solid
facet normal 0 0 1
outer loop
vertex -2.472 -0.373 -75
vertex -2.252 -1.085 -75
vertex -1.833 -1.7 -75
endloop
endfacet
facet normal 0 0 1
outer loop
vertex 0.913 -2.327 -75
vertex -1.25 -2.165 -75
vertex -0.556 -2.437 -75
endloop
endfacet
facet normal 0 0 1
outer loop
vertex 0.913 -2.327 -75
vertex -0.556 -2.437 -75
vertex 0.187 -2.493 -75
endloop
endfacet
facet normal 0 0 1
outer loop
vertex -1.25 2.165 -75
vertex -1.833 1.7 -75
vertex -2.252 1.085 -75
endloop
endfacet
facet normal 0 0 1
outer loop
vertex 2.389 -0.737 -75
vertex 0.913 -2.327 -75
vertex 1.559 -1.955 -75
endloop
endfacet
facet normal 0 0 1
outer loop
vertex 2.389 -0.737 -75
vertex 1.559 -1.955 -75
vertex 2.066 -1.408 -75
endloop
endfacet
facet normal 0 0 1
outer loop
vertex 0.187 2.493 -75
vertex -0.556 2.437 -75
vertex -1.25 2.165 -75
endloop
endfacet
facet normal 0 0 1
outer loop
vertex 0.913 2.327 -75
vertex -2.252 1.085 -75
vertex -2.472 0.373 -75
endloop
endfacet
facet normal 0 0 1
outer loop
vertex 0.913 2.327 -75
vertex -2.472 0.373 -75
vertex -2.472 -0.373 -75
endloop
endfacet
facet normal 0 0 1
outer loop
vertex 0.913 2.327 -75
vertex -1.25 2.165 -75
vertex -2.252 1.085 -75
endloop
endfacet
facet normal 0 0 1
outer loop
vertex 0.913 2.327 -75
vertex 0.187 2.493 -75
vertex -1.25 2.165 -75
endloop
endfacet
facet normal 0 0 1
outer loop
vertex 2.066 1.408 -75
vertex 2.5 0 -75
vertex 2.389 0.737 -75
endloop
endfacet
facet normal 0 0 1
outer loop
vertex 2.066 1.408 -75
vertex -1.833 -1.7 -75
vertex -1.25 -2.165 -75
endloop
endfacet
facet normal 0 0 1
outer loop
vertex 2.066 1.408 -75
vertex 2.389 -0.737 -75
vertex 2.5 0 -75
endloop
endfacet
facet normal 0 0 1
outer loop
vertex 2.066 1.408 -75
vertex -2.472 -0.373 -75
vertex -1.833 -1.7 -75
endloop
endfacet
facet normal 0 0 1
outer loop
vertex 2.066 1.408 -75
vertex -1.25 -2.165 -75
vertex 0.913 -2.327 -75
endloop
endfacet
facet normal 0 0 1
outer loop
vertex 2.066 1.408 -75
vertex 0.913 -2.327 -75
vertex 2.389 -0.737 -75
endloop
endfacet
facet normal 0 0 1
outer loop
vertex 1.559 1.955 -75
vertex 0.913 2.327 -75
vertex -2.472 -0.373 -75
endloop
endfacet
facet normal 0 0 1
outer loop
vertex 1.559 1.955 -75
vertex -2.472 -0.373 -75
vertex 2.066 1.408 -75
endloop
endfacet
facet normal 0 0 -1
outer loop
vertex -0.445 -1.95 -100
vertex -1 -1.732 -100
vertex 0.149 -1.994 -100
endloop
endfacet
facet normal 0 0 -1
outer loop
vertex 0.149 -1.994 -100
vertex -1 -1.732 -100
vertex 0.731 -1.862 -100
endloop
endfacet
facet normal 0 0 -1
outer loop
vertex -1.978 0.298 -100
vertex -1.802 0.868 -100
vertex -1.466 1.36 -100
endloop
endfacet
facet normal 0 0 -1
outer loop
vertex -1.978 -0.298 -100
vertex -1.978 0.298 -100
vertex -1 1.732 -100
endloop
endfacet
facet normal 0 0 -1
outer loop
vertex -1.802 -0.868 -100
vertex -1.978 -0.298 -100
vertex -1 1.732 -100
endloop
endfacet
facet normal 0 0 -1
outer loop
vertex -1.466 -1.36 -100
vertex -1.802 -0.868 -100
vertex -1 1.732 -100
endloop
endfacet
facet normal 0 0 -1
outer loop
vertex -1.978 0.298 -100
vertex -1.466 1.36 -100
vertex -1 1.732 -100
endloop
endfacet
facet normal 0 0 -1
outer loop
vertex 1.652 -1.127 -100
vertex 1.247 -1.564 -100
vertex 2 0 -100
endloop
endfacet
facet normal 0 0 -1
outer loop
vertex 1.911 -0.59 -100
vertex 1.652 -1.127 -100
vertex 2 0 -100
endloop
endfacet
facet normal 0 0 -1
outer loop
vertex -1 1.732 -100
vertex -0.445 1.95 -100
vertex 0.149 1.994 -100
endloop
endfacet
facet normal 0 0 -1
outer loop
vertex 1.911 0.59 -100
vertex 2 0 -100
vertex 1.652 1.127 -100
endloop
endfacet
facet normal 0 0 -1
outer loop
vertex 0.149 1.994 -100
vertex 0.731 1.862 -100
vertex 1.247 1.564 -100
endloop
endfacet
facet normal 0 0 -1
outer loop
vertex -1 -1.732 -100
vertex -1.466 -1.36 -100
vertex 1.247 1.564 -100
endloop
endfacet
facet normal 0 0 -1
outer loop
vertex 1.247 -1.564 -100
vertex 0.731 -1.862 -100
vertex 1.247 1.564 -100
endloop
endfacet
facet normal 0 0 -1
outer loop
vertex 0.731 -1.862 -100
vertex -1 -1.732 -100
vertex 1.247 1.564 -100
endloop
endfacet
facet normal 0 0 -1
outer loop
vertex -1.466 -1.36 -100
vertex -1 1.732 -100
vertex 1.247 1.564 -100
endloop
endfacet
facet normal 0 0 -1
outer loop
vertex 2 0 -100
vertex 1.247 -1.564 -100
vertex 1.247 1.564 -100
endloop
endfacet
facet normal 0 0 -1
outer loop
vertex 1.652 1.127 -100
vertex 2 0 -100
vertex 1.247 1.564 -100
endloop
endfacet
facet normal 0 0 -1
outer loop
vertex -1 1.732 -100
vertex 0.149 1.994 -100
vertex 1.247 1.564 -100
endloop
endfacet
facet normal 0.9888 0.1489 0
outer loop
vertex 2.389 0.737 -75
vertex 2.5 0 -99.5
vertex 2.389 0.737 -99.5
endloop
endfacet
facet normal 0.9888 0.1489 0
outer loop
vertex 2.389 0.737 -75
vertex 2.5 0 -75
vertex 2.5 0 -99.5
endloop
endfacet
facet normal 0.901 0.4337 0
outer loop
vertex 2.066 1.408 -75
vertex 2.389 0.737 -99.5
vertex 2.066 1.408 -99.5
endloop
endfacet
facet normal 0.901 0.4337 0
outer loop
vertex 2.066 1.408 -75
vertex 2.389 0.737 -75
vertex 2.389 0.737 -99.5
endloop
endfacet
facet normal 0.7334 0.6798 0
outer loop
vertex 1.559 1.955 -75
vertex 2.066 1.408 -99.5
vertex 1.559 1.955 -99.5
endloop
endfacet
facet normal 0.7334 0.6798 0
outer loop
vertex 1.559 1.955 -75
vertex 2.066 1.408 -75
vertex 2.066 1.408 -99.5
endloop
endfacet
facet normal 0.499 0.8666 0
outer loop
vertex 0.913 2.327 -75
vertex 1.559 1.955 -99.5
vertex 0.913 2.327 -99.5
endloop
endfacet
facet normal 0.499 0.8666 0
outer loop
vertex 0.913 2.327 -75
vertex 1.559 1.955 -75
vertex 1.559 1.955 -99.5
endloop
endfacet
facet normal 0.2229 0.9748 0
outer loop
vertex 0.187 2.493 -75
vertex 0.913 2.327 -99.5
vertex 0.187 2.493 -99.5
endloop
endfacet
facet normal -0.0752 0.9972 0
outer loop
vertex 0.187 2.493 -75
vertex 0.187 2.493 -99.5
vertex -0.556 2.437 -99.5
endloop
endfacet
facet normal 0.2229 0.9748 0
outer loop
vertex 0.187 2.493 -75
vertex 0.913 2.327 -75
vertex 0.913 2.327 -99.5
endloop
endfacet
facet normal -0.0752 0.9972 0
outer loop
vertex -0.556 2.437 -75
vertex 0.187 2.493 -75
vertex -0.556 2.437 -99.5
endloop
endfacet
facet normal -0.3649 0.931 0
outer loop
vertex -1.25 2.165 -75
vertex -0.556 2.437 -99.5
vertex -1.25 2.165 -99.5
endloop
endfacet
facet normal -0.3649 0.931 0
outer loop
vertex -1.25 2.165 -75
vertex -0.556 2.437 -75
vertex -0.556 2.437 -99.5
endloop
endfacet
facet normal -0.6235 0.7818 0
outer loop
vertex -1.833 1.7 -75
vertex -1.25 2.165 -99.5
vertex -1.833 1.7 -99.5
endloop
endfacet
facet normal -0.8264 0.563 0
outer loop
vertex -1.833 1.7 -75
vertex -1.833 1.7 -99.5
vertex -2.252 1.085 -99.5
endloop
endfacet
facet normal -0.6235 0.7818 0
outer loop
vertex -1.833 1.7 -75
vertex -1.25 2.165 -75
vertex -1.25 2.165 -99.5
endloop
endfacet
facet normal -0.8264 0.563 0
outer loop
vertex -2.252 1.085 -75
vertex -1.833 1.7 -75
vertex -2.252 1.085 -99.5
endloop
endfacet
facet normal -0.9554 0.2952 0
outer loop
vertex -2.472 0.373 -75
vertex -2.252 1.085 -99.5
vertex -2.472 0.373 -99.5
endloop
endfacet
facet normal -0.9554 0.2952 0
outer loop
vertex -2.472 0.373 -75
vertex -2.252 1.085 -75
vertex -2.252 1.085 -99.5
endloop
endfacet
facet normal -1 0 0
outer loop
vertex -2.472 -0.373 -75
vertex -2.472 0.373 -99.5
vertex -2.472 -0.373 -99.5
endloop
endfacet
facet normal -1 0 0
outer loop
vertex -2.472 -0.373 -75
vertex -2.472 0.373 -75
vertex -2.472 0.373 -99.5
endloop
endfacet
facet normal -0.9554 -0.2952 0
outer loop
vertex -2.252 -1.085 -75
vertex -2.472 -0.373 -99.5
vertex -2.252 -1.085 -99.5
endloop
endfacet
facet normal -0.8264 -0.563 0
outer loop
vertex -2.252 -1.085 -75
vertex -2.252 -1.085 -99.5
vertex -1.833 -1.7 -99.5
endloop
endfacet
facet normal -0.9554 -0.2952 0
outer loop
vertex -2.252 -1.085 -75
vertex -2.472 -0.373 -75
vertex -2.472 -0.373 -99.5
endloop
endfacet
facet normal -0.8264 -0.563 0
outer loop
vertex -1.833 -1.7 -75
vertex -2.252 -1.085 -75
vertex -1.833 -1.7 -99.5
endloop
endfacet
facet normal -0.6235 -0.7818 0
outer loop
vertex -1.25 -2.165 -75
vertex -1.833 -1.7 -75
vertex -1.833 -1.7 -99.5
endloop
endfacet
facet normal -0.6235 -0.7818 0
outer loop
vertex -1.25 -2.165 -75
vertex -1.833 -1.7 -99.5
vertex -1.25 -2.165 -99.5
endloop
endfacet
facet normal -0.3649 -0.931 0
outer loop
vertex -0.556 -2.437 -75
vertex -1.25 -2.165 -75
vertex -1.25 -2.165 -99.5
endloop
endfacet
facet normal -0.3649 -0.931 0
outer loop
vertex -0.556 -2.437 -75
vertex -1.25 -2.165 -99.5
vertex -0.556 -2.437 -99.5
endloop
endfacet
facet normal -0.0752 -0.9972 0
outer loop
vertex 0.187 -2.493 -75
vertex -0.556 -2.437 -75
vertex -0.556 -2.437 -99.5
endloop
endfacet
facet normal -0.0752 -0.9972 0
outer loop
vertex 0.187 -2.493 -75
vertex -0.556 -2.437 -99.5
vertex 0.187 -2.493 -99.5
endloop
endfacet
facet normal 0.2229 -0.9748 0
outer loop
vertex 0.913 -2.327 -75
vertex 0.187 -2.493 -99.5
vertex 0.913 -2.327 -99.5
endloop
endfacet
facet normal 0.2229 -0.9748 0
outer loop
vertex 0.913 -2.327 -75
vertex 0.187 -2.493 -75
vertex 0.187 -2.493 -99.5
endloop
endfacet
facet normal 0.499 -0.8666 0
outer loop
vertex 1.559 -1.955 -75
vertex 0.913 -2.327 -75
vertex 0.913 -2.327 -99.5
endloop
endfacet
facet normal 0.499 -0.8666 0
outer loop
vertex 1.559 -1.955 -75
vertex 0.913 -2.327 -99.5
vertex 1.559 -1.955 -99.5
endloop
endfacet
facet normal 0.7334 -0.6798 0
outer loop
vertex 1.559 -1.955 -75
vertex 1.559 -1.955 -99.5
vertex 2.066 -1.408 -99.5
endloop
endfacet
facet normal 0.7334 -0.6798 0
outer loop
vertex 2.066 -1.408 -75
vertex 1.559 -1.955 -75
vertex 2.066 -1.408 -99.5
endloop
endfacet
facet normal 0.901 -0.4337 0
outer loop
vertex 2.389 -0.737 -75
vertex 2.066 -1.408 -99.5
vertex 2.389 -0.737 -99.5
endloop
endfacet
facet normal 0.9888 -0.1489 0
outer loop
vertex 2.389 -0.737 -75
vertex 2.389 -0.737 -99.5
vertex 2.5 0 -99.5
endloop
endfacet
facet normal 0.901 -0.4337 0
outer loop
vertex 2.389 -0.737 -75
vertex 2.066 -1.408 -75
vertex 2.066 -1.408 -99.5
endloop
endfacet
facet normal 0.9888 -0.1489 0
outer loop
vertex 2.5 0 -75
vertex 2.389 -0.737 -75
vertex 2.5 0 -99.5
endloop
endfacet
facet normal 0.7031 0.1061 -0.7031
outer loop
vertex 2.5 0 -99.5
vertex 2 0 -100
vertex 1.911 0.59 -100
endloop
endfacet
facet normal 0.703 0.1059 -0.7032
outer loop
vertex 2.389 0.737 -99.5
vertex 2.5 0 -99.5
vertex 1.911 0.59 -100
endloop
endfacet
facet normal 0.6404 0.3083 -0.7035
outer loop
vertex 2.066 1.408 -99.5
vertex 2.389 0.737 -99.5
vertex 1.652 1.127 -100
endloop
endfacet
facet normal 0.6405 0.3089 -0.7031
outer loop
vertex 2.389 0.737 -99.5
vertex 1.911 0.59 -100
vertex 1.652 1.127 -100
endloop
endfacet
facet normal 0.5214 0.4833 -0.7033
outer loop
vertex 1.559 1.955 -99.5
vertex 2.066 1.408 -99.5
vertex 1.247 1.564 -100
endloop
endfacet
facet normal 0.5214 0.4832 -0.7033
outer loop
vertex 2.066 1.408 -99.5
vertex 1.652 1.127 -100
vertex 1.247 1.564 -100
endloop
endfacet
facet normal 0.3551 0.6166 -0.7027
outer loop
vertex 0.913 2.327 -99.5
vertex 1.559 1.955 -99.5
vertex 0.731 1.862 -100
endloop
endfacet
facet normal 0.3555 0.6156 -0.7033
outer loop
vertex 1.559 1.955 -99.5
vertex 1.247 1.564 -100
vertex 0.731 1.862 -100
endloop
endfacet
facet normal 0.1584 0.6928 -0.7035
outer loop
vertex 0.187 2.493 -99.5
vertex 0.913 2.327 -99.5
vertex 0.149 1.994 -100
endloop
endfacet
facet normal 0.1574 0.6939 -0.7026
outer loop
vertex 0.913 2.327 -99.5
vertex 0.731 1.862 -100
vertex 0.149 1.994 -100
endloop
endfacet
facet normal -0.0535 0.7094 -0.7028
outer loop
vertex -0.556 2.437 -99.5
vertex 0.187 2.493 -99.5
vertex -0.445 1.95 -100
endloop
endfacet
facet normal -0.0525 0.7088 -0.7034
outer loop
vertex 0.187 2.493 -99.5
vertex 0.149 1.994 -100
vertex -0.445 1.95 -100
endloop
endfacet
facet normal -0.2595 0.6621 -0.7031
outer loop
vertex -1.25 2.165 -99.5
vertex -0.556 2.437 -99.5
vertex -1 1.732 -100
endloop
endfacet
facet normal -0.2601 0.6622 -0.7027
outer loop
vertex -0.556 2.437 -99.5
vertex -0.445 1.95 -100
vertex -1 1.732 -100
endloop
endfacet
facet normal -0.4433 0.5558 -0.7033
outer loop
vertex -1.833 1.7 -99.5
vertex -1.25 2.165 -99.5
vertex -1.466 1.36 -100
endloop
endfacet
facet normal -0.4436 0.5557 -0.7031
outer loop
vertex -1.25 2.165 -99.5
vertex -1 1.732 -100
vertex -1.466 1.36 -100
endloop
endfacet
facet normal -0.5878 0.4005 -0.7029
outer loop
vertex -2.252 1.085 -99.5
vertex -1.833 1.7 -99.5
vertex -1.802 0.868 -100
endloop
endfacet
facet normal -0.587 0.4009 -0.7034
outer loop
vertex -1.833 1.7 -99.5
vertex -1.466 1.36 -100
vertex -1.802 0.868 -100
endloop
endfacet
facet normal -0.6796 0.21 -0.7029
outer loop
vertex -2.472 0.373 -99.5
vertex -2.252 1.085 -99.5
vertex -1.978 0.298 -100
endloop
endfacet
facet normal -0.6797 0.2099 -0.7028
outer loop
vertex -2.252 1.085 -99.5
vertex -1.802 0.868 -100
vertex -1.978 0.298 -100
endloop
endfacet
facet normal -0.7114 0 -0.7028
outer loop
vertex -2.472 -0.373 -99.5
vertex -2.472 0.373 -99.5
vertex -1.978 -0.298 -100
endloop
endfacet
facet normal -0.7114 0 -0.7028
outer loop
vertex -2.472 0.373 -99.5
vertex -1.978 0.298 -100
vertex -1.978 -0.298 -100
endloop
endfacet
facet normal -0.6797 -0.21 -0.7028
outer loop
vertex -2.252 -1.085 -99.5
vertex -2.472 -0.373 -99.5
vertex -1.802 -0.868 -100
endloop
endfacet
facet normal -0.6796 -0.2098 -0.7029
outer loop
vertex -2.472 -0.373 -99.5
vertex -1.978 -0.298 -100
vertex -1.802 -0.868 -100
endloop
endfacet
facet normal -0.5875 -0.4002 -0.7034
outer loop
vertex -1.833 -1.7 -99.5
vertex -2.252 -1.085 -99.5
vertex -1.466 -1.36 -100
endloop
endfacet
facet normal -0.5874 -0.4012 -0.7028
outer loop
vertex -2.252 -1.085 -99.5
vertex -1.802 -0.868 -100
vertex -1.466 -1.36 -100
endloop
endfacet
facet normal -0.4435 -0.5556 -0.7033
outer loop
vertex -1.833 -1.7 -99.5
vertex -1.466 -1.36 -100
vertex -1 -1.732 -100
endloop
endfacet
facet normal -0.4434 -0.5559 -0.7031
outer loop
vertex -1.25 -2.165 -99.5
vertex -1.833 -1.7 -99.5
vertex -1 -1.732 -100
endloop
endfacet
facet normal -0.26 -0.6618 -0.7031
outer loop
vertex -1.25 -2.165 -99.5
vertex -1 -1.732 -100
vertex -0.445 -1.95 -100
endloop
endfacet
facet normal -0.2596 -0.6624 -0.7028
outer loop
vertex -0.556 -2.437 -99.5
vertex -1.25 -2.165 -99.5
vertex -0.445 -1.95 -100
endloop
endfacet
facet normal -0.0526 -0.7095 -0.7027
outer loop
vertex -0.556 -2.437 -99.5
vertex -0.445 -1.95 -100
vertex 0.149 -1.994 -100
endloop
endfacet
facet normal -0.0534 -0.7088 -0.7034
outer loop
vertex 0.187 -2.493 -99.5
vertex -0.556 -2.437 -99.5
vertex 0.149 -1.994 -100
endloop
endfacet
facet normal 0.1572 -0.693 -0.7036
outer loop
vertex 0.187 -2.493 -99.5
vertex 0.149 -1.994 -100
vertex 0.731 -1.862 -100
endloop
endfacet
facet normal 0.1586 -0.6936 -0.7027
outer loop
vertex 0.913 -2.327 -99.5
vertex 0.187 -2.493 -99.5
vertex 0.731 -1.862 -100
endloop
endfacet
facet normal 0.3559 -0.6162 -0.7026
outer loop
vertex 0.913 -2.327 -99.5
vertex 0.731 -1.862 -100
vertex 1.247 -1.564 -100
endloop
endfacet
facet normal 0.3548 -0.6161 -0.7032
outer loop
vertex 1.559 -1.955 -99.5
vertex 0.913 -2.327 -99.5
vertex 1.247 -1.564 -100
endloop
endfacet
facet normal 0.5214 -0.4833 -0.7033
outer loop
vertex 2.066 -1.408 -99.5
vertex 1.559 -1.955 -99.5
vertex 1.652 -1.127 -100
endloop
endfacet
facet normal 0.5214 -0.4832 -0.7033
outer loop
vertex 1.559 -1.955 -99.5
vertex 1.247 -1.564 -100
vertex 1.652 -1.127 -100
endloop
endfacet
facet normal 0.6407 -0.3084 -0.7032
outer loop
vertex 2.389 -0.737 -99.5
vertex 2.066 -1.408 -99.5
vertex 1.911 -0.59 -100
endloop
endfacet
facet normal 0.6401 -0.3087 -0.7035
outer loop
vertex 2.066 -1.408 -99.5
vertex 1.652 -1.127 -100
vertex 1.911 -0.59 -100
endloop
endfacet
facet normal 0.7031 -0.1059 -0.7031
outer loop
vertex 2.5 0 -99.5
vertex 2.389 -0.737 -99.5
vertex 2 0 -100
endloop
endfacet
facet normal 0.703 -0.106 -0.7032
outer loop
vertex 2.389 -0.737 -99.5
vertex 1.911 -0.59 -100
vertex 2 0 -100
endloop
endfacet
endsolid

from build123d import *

# Parameters (mm, degrees)
SKETCH1_R          = 2.5
EXTRUDE1_DEPTH     = 100
CHAMFER1_SIZE      = 0.5
SKETCH3_W          = 19.542499602
SKETCH3_H          = 13.436538206
CUT_EXTRUDE1_DEPTH = 175


with BuildPart() as part:
    # Sketch1 → Extrude1 (new, symmetric)
    with BuildSketch(Plane.XY):
        Circle(SKETCH1_R)
    extrude(amount=EXTRUDE1_DEPTH, both=True)

    # Chamfer1
    chamfer1_edges = [part.edges().sort_by_distance(p)[0] for p in [
        (-2.5, 0, -100),
        (-2.5, 0, 100),
    ]]
    chamfer(chamfer1_edges, length=CHAMFER1_SIZE)

    # Sketch3 → Cut-Extrude1 (cut)
    with BuildSketch(Plane.XY.offset(100)):
        Rectangle(SKETCH3_W, SKETCH3_H)
    extrude(amount=-CUT_EXTRUDE1_DEPTH, mode=Mode.SUBTRACT)


solid = part.part
